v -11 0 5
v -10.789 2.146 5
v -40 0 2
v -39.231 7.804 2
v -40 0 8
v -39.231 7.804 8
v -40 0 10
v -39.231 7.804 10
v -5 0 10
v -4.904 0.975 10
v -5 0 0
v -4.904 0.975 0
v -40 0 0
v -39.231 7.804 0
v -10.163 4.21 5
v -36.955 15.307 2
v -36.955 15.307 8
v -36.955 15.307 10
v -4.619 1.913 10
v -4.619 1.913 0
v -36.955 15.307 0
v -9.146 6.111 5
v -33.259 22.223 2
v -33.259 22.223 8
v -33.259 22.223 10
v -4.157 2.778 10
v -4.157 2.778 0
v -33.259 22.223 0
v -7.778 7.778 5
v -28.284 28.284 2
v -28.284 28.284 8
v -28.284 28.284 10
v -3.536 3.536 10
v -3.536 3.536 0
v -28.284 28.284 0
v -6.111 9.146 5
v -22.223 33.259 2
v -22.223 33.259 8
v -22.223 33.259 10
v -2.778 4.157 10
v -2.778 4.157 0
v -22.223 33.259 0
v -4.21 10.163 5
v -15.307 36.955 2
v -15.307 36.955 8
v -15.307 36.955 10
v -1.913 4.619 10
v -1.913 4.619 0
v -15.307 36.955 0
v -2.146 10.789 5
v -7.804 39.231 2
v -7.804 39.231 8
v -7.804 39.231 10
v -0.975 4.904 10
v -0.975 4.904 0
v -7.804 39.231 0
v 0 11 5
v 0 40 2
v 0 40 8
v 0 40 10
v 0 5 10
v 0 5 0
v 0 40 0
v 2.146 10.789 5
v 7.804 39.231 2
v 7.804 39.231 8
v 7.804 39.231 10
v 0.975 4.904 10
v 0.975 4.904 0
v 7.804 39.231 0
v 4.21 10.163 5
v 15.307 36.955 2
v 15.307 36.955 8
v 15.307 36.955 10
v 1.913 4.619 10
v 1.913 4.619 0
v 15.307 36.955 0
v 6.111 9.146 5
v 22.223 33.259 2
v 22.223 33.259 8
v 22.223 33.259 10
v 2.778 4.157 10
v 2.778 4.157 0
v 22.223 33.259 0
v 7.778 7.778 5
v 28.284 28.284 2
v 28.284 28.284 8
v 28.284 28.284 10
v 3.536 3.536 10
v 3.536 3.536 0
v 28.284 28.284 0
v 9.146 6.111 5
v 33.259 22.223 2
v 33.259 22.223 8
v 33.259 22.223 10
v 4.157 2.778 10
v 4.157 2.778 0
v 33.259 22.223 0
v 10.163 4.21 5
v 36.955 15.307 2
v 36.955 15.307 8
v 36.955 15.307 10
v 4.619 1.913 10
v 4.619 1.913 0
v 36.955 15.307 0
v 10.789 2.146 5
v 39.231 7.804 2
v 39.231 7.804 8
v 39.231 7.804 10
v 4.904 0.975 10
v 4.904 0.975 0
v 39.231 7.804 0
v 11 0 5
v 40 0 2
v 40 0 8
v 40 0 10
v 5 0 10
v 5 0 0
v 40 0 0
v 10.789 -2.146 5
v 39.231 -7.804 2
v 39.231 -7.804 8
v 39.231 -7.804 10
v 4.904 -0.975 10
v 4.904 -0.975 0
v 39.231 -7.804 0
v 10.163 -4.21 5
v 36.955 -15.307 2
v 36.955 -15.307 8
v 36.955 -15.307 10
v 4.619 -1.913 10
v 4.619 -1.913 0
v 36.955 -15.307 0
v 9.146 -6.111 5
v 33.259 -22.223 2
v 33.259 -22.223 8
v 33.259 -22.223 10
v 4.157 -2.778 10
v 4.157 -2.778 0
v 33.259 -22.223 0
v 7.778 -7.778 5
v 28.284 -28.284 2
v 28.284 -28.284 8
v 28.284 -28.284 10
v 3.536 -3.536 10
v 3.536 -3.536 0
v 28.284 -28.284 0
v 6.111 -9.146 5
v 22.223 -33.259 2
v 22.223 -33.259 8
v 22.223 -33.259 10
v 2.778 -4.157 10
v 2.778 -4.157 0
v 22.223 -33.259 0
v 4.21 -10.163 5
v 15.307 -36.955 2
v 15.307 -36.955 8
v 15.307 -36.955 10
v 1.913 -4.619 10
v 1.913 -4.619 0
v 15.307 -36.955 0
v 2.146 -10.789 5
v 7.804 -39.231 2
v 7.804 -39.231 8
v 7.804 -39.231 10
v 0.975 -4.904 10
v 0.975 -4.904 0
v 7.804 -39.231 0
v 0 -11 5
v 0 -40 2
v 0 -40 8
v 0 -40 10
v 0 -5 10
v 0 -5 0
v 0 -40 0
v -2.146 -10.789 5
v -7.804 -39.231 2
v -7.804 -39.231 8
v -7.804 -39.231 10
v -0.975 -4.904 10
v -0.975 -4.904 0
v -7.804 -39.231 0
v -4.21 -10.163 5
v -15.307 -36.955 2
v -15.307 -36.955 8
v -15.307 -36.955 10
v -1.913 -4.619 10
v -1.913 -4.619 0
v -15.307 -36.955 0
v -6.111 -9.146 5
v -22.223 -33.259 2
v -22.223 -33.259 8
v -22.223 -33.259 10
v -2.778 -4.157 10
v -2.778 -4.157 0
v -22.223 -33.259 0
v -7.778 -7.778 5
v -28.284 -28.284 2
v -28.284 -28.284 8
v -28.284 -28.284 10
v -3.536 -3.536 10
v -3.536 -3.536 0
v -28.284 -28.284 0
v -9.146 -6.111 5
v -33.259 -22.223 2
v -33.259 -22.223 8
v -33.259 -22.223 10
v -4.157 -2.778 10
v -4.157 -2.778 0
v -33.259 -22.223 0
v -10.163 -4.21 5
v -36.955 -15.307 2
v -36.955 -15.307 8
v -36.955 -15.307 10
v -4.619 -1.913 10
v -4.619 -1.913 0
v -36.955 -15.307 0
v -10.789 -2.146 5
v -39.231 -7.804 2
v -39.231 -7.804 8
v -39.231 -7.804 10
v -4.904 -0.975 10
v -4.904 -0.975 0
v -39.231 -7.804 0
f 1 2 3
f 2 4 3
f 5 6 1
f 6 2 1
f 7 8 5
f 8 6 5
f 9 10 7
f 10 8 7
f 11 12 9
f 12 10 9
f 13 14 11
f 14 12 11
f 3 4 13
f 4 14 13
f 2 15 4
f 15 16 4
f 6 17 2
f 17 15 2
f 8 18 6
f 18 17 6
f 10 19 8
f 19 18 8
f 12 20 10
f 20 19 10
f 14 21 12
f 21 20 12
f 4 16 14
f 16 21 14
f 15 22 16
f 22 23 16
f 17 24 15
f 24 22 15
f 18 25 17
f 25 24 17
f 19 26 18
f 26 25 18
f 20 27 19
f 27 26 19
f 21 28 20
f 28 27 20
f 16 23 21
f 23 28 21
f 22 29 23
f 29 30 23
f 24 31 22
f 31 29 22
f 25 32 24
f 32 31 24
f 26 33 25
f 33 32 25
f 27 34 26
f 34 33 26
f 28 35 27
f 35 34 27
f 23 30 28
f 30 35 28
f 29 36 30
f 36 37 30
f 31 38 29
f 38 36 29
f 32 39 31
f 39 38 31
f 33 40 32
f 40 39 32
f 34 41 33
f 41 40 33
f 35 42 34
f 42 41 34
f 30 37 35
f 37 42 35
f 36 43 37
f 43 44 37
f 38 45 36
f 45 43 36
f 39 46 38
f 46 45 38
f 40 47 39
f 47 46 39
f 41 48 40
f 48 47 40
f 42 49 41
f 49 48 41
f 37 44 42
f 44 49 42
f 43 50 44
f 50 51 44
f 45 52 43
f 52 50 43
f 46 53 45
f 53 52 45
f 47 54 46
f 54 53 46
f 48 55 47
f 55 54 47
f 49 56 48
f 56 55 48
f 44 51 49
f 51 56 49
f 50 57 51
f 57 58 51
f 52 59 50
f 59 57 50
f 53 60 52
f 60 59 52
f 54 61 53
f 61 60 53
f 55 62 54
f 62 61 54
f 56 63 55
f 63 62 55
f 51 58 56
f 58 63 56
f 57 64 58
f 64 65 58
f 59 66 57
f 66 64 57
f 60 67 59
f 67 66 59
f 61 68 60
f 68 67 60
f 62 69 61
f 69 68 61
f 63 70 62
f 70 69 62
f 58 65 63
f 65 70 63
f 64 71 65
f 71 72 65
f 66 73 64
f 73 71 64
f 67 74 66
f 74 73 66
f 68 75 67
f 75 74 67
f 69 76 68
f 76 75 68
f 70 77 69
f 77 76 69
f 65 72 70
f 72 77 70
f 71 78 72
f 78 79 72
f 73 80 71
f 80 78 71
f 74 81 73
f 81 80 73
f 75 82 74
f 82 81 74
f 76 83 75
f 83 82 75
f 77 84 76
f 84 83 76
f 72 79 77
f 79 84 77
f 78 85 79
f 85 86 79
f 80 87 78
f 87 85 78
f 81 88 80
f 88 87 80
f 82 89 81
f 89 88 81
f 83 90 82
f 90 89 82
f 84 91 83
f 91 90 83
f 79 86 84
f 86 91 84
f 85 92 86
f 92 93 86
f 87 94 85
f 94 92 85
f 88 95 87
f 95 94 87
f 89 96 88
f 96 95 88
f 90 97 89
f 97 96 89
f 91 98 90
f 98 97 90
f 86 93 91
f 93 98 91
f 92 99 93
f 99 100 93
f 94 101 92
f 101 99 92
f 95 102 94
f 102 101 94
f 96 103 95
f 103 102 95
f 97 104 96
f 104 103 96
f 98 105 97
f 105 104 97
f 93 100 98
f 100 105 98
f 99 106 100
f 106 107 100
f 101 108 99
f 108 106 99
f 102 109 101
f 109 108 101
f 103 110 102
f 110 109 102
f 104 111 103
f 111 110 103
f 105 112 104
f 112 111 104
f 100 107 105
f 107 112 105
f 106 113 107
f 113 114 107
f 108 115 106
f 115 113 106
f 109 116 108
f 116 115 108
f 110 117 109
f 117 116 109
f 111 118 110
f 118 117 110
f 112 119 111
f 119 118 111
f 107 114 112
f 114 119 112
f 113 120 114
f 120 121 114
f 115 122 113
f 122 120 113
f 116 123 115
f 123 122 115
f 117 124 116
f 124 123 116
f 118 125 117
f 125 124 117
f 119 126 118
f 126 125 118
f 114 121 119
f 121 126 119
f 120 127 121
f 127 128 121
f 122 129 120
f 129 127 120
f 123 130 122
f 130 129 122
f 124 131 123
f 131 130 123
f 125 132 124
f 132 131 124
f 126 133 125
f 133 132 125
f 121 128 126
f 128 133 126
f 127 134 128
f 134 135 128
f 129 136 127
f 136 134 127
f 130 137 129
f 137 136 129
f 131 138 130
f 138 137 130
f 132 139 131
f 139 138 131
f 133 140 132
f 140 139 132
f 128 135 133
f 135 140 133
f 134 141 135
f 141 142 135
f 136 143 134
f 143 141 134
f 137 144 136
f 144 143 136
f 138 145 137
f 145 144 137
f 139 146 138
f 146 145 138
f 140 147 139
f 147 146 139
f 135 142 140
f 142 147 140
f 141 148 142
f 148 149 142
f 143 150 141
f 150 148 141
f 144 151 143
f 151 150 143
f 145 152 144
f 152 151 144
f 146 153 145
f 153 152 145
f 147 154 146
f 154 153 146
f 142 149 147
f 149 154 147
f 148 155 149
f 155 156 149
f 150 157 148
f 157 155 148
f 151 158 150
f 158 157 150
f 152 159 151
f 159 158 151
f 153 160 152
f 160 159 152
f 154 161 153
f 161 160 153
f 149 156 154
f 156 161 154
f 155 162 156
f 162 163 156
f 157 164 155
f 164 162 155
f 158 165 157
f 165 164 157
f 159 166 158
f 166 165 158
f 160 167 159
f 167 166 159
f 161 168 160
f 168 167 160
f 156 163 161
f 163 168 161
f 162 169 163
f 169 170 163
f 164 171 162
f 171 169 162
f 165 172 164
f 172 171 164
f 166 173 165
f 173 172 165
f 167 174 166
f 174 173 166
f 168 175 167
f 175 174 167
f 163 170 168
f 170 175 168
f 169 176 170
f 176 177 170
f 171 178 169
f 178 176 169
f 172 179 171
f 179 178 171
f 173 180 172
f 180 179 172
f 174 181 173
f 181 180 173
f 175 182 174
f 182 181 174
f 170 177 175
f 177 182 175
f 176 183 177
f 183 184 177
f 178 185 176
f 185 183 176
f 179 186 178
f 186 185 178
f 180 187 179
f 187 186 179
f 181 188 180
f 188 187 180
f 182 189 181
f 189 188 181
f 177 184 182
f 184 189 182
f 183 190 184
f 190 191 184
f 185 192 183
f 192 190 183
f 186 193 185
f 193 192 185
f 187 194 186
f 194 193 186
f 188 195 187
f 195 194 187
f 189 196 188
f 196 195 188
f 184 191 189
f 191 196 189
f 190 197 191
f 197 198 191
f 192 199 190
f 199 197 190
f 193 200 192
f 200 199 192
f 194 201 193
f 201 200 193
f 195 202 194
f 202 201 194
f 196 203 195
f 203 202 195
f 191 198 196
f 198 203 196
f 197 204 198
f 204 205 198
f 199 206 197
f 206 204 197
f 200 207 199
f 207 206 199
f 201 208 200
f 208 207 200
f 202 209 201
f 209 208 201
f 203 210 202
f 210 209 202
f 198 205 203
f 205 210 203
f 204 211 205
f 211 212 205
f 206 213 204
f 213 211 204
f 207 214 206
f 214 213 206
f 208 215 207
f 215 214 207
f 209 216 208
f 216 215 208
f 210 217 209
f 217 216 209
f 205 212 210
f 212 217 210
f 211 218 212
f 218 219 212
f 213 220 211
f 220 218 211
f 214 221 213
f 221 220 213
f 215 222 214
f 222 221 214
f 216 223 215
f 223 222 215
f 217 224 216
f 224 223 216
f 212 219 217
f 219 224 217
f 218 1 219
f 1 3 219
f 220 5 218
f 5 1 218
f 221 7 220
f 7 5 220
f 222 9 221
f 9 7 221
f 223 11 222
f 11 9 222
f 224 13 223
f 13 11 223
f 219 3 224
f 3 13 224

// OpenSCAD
$fn = 32;

// ----------------------------------------------------------------------
// Revolved part: V-groove pulley R40
// ----------------------------------------------------------------------

// --- parameters (mm) ---
bore_r = 5;               // bore radius
rim_r = 40;               // rim radius
rim_t = 10;               // rim width
groove_r = 11;            // groove root radius
groove_w = 3;             // groove half width
revolve_angle = 360;      // revolve sweep, degrees

bore_d = 2 * bore_r;
rim_d = 2 * rim_r;
groove_d = 2 * groove_r;

profile = [[5, 0], [40, 0], [40, 2], [11, 5], [40, 8], [40, 10], [5, 10]];  // primary outline, 7 points, counter clockwise

// --- the one profile operation ---
rotate_extrude(angle = revolve_angle) polygon(points = profile);
